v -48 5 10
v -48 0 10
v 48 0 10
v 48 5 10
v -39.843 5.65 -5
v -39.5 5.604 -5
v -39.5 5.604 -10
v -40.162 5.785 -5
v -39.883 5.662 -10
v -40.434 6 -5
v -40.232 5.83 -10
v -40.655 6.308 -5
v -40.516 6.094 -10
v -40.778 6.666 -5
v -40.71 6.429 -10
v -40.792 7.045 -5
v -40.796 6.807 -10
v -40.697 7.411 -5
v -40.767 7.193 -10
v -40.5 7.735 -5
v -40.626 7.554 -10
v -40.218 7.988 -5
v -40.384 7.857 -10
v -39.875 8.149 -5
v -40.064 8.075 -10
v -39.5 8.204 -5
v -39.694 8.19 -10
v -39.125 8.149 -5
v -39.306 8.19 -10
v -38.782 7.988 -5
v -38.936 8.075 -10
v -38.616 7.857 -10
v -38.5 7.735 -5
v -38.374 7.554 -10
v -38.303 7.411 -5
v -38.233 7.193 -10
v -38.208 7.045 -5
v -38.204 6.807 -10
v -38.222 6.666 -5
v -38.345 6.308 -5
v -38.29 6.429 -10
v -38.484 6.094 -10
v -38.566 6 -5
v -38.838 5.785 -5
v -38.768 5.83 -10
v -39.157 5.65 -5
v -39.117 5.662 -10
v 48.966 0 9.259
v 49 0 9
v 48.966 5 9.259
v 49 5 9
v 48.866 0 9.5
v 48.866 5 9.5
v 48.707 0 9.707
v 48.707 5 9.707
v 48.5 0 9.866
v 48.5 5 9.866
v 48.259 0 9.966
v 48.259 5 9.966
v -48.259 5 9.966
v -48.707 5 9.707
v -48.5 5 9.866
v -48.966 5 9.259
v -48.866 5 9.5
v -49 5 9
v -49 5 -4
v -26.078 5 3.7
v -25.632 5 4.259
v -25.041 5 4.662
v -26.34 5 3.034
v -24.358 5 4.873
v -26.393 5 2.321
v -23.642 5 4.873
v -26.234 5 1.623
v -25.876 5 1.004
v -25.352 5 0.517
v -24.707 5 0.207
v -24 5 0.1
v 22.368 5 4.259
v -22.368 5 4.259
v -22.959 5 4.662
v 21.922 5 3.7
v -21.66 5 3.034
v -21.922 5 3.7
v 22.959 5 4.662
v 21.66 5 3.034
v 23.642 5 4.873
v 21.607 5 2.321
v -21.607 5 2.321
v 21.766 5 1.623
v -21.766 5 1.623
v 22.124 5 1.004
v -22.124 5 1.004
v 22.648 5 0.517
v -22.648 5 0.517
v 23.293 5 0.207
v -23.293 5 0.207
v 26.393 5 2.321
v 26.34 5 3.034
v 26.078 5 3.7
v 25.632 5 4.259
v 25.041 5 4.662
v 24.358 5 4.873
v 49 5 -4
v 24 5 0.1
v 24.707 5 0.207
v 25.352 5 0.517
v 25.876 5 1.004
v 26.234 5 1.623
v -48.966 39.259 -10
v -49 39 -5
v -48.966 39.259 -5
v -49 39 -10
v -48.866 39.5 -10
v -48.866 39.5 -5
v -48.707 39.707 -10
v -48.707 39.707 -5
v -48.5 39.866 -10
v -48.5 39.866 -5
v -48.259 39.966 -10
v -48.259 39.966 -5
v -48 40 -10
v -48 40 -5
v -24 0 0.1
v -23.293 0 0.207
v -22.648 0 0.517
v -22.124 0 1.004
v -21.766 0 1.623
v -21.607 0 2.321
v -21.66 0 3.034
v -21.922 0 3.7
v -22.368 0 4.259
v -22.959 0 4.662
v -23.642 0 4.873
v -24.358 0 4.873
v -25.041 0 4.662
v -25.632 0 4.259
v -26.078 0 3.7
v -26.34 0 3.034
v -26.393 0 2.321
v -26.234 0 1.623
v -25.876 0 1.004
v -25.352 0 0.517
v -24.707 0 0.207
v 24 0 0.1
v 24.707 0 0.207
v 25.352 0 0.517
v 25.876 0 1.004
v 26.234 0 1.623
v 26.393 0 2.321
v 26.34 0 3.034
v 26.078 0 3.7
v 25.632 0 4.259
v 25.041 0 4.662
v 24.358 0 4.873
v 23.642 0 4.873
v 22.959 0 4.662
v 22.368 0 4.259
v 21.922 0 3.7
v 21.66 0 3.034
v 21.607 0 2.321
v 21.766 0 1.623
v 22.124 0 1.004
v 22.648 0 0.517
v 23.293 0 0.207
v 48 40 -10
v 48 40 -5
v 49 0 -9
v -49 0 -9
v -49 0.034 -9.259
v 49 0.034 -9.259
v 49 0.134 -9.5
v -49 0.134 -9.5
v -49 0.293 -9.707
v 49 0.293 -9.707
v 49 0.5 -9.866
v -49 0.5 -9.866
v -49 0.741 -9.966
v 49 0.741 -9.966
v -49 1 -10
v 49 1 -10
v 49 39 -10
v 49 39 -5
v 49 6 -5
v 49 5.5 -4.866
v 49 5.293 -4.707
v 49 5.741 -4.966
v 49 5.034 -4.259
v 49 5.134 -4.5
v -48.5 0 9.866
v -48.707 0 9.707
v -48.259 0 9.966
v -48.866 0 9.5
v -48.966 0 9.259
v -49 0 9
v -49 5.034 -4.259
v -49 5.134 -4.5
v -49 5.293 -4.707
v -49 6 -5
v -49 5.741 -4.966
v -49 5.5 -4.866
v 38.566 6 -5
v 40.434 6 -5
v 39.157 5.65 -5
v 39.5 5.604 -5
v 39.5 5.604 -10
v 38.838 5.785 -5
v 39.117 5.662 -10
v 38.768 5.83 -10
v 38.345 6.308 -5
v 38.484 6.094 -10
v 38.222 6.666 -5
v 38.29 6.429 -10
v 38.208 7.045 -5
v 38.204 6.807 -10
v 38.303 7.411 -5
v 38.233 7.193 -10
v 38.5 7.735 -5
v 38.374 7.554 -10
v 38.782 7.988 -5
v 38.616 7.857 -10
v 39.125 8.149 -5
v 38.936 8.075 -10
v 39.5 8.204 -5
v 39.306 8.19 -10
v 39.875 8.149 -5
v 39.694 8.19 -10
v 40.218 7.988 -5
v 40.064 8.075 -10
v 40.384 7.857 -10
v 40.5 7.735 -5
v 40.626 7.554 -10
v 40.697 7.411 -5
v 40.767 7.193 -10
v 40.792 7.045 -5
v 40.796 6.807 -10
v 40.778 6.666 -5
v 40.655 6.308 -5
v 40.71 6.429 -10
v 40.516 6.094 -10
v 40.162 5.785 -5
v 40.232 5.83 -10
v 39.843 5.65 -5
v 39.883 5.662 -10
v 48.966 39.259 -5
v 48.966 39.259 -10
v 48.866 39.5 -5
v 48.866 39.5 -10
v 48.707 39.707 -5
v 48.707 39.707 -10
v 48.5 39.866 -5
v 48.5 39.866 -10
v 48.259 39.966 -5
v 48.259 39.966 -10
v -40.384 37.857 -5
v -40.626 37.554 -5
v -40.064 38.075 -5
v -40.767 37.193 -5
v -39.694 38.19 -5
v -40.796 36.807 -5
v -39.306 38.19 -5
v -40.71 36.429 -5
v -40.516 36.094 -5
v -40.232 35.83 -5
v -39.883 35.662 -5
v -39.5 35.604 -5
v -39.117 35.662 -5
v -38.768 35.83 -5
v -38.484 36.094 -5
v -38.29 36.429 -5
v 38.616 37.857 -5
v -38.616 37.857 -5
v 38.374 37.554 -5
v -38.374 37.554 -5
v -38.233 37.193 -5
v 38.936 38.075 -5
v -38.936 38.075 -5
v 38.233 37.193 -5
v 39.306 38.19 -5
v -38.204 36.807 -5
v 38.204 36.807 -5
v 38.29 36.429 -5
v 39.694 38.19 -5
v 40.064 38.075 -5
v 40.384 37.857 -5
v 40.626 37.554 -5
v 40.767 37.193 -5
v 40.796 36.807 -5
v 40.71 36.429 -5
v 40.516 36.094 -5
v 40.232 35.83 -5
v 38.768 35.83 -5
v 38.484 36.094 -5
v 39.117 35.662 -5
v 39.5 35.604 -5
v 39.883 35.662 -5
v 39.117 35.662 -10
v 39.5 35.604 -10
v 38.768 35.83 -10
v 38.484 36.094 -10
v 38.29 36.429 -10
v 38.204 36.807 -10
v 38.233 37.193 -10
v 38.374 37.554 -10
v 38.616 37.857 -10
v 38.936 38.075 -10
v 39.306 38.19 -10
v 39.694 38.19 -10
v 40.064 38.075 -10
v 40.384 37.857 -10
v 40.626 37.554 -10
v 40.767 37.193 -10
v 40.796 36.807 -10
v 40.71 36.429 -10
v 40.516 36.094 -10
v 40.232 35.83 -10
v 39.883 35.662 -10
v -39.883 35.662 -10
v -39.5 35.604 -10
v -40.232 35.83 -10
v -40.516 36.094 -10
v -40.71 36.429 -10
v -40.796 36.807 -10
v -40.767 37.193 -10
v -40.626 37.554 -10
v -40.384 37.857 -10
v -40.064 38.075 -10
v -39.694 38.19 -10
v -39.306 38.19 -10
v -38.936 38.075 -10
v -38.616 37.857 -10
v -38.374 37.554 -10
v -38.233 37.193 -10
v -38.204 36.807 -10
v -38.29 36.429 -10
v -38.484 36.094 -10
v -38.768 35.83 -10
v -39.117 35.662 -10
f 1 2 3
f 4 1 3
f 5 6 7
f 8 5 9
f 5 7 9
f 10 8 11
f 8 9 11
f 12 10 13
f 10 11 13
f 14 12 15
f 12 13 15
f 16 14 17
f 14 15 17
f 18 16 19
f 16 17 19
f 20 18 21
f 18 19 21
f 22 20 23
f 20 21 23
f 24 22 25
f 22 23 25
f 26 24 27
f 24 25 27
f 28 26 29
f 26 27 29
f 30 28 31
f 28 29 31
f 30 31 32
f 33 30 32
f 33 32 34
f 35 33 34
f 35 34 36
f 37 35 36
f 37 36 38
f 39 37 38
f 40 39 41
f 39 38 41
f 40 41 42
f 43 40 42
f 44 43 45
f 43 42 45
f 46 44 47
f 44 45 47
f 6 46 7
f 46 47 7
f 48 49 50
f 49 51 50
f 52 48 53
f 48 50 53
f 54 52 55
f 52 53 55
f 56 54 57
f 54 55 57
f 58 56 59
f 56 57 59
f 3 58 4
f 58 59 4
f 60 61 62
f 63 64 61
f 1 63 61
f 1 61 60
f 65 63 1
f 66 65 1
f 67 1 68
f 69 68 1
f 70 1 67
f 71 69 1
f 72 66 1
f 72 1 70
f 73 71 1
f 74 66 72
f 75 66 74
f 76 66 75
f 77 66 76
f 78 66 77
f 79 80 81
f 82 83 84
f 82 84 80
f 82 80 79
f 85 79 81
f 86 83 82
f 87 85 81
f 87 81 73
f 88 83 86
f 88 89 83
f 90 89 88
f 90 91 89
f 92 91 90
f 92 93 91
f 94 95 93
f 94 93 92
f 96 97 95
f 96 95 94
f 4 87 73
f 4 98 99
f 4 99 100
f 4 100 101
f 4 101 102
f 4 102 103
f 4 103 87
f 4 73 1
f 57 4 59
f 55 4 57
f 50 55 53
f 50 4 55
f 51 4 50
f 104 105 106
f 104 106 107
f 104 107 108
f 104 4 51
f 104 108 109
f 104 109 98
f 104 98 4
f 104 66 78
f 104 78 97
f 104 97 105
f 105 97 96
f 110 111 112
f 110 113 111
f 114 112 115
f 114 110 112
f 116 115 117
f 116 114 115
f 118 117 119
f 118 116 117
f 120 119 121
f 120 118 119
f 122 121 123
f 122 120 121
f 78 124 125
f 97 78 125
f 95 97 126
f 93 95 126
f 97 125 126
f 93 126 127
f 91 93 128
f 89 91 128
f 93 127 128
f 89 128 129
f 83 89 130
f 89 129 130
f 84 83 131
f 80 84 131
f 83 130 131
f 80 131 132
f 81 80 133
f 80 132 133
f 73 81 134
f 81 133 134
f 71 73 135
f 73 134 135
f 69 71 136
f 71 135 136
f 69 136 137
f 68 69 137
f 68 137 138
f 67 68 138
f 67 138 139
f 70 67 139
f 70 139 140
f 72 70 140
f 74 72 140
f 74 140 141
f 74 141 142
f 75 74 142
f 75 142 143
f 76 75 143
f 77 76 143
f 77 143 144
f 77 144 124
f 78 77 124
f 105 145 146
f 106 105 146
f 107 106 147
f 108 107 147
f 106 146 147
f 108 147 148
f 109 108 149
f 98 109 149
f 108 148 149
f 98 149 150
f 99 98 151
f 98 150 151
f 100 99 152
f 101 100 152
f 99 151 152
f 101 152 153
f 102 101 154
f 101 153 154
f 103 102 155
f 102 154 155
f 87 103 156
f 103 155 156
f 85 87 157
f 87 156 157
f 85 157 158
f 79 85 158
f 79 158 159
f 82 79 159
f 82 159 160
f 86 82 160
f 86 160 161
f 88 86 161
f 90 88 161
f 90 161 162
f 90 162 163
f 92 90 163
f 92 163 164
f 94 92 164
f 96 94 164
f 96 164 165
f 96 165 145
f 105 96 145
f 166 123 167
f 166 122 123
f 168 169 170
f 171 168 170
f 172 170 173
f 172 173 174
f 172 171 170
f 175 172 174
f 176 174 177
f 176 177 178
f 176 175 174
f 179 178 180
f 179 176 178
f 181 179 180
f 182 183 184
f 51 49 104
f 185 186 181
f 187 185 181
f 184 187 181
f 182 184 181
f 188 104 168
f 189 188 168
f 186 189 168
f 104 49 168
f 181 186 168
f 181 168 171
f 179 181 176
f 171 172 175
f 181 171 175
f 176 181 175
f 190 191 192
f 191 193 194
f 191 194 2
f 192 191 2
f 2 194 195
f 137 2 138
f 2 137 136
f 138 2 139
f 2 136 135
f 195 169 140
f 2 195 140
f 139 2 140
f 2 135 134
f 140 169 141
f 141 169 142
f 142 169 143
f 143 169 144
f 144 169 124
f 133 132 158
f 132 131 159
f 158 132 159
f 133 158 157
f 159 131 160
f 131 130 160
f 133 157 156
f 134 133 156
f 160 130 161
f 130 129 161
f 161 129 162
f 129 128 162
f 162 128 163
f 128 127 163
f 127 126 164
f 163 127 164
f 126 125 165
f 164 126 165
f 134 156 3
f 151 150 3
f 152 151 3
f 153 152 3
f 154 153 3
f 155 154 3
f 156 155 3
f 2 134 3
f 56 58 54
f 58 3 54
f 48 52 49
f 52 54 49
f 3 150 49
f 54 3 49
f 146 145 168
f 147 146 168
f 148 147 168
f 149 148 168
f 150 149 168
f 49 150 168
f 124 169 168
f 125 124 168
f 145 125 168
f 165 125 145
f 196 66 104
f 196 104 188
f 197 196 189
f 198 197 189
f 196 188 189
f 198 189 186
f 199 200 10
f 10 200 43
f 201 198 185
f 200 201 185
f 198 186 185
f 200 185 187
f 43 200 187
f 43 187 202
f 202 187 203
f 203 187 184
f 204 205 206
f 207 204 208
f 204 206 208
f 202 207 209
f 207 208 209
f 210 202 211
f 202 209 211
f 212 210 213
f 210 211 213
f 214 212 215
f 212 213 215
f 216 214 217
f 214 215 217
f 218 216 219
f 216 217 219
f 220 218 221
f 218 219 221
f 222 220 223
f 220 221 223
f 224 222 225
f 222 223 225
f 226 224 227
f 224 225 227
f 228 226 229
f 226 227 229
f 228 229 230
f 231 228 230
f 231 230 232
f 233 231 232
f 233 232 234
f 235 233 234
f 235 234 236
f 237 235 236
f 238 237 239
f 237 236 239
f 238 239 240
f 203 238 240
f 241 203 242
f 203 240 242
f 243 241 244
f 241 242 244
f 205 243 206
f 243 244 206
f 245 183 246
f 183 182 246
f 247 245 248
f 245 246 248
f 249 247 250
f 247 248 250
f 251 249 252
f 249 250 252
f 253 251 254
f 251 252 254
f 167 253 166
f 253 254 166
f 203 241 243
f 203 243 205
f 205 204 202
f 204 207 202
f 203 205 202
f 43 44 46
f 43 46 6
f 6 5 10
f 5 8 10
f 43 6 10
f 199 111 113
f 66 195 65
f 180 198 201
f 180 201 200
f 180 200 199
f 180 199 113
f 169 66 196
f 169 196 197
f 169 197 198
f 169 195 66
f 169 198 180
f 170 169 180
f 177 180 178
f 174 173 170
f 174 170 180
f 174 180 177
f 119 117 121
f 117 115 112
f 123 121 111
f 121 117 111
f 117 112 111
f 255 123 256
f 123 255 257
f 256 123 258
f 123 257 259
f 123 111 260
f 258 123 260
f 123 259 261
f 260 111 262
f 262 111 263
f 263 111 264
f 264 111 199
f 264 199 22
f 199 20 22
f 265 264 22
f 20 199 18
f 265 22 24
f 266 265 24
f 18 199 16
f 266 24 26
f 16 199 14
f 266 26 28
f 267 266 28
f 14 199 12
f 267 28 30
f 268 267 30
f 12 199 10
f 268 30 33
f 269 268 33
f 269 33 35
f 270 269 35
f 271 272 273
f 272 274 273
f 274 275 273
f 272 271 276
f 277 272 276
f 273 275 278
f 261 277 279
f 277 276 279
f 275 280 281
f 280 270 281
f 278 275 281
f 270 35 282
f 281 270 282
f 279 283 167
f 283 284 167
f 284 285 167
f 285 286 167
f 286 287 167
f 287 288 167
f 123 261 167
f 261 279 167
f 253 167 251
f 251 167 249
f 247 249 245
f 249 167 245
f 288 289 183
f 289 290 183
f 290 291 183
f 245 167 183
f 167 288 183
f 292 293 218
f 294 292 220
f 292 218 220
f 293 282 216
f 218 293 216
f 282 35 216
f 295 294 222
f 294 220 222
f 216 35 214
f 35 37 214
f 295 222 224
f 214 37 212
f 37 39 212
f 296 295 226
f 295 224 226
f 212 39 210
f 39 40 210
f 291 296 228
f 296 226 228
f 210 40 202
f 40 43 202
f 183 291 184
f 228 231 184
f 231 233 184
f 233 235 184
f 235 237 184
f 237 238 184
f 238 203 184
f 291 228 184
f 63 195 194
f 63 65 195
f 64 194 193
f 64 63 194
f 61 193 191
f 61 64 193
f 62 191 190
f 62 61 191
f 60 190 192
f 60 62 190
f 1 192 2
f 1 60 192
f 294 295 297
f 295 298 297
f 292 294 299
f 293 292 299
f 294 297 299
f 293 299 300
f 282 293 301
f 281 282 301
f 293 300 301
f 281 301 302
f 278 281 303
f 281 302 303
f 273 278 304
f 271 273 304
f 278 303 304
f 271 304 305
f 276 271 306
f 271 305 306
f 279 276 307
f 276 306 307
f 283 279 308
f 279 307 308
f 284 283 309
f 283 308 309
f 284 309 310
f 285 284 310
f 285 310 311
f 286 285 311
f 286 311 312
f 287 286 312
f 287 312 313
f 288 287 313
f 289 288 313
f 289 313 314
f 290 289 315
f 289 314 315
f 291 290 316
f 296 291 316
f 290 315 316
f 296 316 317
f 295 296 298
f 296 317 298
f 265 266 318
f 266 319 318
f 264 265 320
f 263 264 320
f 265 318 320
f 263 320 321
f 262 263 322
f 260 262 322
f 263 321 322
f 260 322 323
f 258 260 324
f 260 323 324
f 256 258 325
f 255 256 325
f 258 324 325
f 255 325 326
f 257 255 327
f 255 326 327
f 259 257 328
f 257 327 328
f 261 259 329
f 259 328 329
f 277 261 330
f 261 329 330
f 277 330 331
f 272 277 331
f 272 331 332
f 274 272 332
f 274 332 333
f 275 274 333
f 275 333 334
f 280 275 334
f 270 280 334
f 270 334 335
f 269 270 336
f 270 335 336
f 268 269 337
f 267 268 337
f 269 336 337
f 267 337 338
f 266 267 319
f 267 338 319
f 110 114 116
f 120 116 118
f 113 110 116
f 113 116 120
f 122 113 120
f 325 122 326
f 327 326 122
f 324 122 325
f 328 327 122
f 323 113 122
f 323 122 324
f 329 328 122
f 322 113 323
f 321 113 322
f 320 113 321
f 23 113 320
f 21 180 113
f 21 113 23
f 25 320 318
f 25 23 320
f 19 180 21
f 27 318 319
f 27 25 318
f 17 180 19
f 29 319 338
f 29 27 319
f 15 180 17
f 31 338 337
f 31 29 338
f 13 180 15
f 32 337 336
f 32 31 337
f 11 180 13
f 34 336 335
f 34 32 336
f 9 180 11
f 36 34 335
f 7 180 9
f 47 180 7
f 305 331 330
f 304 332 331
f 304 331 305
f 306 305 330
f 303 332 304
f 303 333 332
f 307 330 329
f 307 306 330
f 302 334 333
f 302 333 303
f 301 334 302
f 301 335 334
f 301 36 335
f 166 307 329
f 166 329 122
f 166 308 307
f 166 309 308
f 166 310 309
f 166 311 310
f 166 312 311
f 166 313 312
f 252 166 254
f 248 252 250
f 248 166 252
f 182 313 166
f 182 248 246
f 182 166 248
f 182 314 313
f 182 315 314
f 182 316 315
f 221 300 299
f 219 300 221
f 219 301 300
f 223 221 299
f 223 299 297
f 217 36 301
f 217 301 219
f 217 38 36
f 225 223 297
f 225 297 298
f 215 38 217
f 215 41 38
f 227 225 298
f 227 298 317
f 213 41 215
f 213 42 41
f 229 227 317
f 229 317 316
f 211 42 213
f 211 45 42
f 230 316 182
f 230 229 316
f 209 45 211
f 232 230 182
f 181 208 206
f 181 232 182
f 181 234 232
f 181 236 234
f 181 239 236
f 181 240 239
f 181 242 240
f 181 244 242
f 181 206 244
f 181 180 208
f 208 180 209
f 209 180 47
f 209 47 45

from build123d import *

# Parameters (mm, degrees)
SKETCH1_W                     = 98
SKETCH1_H                     = 20
BOSS_EXTRUDE1_DEPTH           = 5
SKETCH2_W                     = 98
SKETCH2_H                     = 5
BOSS_EXTRUDE2_DEPTH           = 35
FILLET1_R                     = 1
SKETCH5_W                     = 1.3
SKETCH5_H                     = 5
M2_CLEARANCE_HOLE1_AT_2_COUNT = 2
M2_CLEARANCE_HOLE1_AT_2_PITCH = 30
M2_CLEARANCE_HOLE1_AT_3_COUNT = 2
M2_CLEARANCE_HOLE1_AT_3_PITCH = 79
M2_CLEARANCE_HOLE1_AT_4_COUNT = 2
M2_CLEARANCE_HOLE1_AT_4_PITCH = 84.504437753
M4_CLEARANCE_HOLE1_D          = 4.8


with BuildPart() as part:
    # Sketch1 → Boss-Extrude1 (new body)
    with BuildSketch(Plane(origin=(0, 0, 0), x_dir=(1, 0, 0), z_dir=(0, 1, 0))):
        Rectangle(SKETCH1_W, SKETCH1_H)
    extrude(amount=BOSS_EXTRUDE1_DEPTH)

    # Sketch2 → Boss-Extrude2 (add)
    with BuildSketch(Plane(origin=(0, 5, 0), x_dir=(1, 0, 0), z_dir=(0, 1, 0))):
        with Locations((0, 7.5)):
            Rectangle(SKETCH2_W, SKETCH2_H)
    extrude(amount=BOSS_EXTRUDE2_DEPTH)

    # Fillet1
    fillet1_edges = [part.edges().sort_by_distance(p)[0] for p in [
        (0, 5, -5),
        (49, 40, -7.5),
        (-49, 40, -7.5),
        (0, 0, -10),
        (49, 2.5, 10),
        (-49, 2.5, 10),
    ]]
    fillet(fillet1_edges, radius=FILLET1_R)

    # Sketch5 → M2 Clearance Hole1 (revolve, cut)
    with BuildSketch(Plane(origin=(39.5, 36.904051391, -5), x_dir=(0, -1, 0), z_dir=(1, 0, 0))):
        with Locations((0.65, 2.5)):
            Rectangle(SKETCH5_W, SKETCH5_H)
    m2_clearance_hole1 = revolve(axis=Axis((39.5, 36.904051391, 1.35), (0, 0, -1)), mode=Mode.SUBTRACT)

    # M2 Clearance Hole1 at 2: M2 Clearance Hole1 ×2
    with Locations(*[(0, -i * M2_CLEARANCE_HOLE1_AT_2_PITCH, 0) for i in range(1, M2_CLEARANCE_HOLE1_AT_2_COUNT)]):
        add(m2_clearance_hole1, mode=Mode.SUBTRACT)

    # M2 Clearance Hole1 at 3: M2 Clearance Hole1 ×2
    with Locations(*[(-i * M2_CLEARANCE_HOLE1_AT_3_PITCH, 0, 0) for i in range(1, M2_CLEARANCE_HOLE1_AT_3_COUNT)]):
        add(m2_clearance_hole1, mode=Mode.SUBTRACT)

    # M2 Clearance Hole1 at 4: M2 Clearance Hole1 ×2
    with Locations(*[Vector(-0.93486214570929, -0.35501094140860234, 0) * (i * M2_CLEARANCE_HOLE1_AT_4_PITCH) for i in range(1, M2_CLEARANCE_HOLE1_AT_4_COUNT)]):
        add(m2_clearance_hole1, mode=Mode.SUBTRACT)

    # M4 Clearance Hole1 (through all)
    with Locations(Plane(origin=(-24, 5, 2.5), x_dir=(0, 0, 1), z_dir=(0, 1, 0))):
        with Locations((0, 0), (0, 48)):
            Hole(M4_CLEARANCE_HOLE1_D / 2)


solid = part.part
